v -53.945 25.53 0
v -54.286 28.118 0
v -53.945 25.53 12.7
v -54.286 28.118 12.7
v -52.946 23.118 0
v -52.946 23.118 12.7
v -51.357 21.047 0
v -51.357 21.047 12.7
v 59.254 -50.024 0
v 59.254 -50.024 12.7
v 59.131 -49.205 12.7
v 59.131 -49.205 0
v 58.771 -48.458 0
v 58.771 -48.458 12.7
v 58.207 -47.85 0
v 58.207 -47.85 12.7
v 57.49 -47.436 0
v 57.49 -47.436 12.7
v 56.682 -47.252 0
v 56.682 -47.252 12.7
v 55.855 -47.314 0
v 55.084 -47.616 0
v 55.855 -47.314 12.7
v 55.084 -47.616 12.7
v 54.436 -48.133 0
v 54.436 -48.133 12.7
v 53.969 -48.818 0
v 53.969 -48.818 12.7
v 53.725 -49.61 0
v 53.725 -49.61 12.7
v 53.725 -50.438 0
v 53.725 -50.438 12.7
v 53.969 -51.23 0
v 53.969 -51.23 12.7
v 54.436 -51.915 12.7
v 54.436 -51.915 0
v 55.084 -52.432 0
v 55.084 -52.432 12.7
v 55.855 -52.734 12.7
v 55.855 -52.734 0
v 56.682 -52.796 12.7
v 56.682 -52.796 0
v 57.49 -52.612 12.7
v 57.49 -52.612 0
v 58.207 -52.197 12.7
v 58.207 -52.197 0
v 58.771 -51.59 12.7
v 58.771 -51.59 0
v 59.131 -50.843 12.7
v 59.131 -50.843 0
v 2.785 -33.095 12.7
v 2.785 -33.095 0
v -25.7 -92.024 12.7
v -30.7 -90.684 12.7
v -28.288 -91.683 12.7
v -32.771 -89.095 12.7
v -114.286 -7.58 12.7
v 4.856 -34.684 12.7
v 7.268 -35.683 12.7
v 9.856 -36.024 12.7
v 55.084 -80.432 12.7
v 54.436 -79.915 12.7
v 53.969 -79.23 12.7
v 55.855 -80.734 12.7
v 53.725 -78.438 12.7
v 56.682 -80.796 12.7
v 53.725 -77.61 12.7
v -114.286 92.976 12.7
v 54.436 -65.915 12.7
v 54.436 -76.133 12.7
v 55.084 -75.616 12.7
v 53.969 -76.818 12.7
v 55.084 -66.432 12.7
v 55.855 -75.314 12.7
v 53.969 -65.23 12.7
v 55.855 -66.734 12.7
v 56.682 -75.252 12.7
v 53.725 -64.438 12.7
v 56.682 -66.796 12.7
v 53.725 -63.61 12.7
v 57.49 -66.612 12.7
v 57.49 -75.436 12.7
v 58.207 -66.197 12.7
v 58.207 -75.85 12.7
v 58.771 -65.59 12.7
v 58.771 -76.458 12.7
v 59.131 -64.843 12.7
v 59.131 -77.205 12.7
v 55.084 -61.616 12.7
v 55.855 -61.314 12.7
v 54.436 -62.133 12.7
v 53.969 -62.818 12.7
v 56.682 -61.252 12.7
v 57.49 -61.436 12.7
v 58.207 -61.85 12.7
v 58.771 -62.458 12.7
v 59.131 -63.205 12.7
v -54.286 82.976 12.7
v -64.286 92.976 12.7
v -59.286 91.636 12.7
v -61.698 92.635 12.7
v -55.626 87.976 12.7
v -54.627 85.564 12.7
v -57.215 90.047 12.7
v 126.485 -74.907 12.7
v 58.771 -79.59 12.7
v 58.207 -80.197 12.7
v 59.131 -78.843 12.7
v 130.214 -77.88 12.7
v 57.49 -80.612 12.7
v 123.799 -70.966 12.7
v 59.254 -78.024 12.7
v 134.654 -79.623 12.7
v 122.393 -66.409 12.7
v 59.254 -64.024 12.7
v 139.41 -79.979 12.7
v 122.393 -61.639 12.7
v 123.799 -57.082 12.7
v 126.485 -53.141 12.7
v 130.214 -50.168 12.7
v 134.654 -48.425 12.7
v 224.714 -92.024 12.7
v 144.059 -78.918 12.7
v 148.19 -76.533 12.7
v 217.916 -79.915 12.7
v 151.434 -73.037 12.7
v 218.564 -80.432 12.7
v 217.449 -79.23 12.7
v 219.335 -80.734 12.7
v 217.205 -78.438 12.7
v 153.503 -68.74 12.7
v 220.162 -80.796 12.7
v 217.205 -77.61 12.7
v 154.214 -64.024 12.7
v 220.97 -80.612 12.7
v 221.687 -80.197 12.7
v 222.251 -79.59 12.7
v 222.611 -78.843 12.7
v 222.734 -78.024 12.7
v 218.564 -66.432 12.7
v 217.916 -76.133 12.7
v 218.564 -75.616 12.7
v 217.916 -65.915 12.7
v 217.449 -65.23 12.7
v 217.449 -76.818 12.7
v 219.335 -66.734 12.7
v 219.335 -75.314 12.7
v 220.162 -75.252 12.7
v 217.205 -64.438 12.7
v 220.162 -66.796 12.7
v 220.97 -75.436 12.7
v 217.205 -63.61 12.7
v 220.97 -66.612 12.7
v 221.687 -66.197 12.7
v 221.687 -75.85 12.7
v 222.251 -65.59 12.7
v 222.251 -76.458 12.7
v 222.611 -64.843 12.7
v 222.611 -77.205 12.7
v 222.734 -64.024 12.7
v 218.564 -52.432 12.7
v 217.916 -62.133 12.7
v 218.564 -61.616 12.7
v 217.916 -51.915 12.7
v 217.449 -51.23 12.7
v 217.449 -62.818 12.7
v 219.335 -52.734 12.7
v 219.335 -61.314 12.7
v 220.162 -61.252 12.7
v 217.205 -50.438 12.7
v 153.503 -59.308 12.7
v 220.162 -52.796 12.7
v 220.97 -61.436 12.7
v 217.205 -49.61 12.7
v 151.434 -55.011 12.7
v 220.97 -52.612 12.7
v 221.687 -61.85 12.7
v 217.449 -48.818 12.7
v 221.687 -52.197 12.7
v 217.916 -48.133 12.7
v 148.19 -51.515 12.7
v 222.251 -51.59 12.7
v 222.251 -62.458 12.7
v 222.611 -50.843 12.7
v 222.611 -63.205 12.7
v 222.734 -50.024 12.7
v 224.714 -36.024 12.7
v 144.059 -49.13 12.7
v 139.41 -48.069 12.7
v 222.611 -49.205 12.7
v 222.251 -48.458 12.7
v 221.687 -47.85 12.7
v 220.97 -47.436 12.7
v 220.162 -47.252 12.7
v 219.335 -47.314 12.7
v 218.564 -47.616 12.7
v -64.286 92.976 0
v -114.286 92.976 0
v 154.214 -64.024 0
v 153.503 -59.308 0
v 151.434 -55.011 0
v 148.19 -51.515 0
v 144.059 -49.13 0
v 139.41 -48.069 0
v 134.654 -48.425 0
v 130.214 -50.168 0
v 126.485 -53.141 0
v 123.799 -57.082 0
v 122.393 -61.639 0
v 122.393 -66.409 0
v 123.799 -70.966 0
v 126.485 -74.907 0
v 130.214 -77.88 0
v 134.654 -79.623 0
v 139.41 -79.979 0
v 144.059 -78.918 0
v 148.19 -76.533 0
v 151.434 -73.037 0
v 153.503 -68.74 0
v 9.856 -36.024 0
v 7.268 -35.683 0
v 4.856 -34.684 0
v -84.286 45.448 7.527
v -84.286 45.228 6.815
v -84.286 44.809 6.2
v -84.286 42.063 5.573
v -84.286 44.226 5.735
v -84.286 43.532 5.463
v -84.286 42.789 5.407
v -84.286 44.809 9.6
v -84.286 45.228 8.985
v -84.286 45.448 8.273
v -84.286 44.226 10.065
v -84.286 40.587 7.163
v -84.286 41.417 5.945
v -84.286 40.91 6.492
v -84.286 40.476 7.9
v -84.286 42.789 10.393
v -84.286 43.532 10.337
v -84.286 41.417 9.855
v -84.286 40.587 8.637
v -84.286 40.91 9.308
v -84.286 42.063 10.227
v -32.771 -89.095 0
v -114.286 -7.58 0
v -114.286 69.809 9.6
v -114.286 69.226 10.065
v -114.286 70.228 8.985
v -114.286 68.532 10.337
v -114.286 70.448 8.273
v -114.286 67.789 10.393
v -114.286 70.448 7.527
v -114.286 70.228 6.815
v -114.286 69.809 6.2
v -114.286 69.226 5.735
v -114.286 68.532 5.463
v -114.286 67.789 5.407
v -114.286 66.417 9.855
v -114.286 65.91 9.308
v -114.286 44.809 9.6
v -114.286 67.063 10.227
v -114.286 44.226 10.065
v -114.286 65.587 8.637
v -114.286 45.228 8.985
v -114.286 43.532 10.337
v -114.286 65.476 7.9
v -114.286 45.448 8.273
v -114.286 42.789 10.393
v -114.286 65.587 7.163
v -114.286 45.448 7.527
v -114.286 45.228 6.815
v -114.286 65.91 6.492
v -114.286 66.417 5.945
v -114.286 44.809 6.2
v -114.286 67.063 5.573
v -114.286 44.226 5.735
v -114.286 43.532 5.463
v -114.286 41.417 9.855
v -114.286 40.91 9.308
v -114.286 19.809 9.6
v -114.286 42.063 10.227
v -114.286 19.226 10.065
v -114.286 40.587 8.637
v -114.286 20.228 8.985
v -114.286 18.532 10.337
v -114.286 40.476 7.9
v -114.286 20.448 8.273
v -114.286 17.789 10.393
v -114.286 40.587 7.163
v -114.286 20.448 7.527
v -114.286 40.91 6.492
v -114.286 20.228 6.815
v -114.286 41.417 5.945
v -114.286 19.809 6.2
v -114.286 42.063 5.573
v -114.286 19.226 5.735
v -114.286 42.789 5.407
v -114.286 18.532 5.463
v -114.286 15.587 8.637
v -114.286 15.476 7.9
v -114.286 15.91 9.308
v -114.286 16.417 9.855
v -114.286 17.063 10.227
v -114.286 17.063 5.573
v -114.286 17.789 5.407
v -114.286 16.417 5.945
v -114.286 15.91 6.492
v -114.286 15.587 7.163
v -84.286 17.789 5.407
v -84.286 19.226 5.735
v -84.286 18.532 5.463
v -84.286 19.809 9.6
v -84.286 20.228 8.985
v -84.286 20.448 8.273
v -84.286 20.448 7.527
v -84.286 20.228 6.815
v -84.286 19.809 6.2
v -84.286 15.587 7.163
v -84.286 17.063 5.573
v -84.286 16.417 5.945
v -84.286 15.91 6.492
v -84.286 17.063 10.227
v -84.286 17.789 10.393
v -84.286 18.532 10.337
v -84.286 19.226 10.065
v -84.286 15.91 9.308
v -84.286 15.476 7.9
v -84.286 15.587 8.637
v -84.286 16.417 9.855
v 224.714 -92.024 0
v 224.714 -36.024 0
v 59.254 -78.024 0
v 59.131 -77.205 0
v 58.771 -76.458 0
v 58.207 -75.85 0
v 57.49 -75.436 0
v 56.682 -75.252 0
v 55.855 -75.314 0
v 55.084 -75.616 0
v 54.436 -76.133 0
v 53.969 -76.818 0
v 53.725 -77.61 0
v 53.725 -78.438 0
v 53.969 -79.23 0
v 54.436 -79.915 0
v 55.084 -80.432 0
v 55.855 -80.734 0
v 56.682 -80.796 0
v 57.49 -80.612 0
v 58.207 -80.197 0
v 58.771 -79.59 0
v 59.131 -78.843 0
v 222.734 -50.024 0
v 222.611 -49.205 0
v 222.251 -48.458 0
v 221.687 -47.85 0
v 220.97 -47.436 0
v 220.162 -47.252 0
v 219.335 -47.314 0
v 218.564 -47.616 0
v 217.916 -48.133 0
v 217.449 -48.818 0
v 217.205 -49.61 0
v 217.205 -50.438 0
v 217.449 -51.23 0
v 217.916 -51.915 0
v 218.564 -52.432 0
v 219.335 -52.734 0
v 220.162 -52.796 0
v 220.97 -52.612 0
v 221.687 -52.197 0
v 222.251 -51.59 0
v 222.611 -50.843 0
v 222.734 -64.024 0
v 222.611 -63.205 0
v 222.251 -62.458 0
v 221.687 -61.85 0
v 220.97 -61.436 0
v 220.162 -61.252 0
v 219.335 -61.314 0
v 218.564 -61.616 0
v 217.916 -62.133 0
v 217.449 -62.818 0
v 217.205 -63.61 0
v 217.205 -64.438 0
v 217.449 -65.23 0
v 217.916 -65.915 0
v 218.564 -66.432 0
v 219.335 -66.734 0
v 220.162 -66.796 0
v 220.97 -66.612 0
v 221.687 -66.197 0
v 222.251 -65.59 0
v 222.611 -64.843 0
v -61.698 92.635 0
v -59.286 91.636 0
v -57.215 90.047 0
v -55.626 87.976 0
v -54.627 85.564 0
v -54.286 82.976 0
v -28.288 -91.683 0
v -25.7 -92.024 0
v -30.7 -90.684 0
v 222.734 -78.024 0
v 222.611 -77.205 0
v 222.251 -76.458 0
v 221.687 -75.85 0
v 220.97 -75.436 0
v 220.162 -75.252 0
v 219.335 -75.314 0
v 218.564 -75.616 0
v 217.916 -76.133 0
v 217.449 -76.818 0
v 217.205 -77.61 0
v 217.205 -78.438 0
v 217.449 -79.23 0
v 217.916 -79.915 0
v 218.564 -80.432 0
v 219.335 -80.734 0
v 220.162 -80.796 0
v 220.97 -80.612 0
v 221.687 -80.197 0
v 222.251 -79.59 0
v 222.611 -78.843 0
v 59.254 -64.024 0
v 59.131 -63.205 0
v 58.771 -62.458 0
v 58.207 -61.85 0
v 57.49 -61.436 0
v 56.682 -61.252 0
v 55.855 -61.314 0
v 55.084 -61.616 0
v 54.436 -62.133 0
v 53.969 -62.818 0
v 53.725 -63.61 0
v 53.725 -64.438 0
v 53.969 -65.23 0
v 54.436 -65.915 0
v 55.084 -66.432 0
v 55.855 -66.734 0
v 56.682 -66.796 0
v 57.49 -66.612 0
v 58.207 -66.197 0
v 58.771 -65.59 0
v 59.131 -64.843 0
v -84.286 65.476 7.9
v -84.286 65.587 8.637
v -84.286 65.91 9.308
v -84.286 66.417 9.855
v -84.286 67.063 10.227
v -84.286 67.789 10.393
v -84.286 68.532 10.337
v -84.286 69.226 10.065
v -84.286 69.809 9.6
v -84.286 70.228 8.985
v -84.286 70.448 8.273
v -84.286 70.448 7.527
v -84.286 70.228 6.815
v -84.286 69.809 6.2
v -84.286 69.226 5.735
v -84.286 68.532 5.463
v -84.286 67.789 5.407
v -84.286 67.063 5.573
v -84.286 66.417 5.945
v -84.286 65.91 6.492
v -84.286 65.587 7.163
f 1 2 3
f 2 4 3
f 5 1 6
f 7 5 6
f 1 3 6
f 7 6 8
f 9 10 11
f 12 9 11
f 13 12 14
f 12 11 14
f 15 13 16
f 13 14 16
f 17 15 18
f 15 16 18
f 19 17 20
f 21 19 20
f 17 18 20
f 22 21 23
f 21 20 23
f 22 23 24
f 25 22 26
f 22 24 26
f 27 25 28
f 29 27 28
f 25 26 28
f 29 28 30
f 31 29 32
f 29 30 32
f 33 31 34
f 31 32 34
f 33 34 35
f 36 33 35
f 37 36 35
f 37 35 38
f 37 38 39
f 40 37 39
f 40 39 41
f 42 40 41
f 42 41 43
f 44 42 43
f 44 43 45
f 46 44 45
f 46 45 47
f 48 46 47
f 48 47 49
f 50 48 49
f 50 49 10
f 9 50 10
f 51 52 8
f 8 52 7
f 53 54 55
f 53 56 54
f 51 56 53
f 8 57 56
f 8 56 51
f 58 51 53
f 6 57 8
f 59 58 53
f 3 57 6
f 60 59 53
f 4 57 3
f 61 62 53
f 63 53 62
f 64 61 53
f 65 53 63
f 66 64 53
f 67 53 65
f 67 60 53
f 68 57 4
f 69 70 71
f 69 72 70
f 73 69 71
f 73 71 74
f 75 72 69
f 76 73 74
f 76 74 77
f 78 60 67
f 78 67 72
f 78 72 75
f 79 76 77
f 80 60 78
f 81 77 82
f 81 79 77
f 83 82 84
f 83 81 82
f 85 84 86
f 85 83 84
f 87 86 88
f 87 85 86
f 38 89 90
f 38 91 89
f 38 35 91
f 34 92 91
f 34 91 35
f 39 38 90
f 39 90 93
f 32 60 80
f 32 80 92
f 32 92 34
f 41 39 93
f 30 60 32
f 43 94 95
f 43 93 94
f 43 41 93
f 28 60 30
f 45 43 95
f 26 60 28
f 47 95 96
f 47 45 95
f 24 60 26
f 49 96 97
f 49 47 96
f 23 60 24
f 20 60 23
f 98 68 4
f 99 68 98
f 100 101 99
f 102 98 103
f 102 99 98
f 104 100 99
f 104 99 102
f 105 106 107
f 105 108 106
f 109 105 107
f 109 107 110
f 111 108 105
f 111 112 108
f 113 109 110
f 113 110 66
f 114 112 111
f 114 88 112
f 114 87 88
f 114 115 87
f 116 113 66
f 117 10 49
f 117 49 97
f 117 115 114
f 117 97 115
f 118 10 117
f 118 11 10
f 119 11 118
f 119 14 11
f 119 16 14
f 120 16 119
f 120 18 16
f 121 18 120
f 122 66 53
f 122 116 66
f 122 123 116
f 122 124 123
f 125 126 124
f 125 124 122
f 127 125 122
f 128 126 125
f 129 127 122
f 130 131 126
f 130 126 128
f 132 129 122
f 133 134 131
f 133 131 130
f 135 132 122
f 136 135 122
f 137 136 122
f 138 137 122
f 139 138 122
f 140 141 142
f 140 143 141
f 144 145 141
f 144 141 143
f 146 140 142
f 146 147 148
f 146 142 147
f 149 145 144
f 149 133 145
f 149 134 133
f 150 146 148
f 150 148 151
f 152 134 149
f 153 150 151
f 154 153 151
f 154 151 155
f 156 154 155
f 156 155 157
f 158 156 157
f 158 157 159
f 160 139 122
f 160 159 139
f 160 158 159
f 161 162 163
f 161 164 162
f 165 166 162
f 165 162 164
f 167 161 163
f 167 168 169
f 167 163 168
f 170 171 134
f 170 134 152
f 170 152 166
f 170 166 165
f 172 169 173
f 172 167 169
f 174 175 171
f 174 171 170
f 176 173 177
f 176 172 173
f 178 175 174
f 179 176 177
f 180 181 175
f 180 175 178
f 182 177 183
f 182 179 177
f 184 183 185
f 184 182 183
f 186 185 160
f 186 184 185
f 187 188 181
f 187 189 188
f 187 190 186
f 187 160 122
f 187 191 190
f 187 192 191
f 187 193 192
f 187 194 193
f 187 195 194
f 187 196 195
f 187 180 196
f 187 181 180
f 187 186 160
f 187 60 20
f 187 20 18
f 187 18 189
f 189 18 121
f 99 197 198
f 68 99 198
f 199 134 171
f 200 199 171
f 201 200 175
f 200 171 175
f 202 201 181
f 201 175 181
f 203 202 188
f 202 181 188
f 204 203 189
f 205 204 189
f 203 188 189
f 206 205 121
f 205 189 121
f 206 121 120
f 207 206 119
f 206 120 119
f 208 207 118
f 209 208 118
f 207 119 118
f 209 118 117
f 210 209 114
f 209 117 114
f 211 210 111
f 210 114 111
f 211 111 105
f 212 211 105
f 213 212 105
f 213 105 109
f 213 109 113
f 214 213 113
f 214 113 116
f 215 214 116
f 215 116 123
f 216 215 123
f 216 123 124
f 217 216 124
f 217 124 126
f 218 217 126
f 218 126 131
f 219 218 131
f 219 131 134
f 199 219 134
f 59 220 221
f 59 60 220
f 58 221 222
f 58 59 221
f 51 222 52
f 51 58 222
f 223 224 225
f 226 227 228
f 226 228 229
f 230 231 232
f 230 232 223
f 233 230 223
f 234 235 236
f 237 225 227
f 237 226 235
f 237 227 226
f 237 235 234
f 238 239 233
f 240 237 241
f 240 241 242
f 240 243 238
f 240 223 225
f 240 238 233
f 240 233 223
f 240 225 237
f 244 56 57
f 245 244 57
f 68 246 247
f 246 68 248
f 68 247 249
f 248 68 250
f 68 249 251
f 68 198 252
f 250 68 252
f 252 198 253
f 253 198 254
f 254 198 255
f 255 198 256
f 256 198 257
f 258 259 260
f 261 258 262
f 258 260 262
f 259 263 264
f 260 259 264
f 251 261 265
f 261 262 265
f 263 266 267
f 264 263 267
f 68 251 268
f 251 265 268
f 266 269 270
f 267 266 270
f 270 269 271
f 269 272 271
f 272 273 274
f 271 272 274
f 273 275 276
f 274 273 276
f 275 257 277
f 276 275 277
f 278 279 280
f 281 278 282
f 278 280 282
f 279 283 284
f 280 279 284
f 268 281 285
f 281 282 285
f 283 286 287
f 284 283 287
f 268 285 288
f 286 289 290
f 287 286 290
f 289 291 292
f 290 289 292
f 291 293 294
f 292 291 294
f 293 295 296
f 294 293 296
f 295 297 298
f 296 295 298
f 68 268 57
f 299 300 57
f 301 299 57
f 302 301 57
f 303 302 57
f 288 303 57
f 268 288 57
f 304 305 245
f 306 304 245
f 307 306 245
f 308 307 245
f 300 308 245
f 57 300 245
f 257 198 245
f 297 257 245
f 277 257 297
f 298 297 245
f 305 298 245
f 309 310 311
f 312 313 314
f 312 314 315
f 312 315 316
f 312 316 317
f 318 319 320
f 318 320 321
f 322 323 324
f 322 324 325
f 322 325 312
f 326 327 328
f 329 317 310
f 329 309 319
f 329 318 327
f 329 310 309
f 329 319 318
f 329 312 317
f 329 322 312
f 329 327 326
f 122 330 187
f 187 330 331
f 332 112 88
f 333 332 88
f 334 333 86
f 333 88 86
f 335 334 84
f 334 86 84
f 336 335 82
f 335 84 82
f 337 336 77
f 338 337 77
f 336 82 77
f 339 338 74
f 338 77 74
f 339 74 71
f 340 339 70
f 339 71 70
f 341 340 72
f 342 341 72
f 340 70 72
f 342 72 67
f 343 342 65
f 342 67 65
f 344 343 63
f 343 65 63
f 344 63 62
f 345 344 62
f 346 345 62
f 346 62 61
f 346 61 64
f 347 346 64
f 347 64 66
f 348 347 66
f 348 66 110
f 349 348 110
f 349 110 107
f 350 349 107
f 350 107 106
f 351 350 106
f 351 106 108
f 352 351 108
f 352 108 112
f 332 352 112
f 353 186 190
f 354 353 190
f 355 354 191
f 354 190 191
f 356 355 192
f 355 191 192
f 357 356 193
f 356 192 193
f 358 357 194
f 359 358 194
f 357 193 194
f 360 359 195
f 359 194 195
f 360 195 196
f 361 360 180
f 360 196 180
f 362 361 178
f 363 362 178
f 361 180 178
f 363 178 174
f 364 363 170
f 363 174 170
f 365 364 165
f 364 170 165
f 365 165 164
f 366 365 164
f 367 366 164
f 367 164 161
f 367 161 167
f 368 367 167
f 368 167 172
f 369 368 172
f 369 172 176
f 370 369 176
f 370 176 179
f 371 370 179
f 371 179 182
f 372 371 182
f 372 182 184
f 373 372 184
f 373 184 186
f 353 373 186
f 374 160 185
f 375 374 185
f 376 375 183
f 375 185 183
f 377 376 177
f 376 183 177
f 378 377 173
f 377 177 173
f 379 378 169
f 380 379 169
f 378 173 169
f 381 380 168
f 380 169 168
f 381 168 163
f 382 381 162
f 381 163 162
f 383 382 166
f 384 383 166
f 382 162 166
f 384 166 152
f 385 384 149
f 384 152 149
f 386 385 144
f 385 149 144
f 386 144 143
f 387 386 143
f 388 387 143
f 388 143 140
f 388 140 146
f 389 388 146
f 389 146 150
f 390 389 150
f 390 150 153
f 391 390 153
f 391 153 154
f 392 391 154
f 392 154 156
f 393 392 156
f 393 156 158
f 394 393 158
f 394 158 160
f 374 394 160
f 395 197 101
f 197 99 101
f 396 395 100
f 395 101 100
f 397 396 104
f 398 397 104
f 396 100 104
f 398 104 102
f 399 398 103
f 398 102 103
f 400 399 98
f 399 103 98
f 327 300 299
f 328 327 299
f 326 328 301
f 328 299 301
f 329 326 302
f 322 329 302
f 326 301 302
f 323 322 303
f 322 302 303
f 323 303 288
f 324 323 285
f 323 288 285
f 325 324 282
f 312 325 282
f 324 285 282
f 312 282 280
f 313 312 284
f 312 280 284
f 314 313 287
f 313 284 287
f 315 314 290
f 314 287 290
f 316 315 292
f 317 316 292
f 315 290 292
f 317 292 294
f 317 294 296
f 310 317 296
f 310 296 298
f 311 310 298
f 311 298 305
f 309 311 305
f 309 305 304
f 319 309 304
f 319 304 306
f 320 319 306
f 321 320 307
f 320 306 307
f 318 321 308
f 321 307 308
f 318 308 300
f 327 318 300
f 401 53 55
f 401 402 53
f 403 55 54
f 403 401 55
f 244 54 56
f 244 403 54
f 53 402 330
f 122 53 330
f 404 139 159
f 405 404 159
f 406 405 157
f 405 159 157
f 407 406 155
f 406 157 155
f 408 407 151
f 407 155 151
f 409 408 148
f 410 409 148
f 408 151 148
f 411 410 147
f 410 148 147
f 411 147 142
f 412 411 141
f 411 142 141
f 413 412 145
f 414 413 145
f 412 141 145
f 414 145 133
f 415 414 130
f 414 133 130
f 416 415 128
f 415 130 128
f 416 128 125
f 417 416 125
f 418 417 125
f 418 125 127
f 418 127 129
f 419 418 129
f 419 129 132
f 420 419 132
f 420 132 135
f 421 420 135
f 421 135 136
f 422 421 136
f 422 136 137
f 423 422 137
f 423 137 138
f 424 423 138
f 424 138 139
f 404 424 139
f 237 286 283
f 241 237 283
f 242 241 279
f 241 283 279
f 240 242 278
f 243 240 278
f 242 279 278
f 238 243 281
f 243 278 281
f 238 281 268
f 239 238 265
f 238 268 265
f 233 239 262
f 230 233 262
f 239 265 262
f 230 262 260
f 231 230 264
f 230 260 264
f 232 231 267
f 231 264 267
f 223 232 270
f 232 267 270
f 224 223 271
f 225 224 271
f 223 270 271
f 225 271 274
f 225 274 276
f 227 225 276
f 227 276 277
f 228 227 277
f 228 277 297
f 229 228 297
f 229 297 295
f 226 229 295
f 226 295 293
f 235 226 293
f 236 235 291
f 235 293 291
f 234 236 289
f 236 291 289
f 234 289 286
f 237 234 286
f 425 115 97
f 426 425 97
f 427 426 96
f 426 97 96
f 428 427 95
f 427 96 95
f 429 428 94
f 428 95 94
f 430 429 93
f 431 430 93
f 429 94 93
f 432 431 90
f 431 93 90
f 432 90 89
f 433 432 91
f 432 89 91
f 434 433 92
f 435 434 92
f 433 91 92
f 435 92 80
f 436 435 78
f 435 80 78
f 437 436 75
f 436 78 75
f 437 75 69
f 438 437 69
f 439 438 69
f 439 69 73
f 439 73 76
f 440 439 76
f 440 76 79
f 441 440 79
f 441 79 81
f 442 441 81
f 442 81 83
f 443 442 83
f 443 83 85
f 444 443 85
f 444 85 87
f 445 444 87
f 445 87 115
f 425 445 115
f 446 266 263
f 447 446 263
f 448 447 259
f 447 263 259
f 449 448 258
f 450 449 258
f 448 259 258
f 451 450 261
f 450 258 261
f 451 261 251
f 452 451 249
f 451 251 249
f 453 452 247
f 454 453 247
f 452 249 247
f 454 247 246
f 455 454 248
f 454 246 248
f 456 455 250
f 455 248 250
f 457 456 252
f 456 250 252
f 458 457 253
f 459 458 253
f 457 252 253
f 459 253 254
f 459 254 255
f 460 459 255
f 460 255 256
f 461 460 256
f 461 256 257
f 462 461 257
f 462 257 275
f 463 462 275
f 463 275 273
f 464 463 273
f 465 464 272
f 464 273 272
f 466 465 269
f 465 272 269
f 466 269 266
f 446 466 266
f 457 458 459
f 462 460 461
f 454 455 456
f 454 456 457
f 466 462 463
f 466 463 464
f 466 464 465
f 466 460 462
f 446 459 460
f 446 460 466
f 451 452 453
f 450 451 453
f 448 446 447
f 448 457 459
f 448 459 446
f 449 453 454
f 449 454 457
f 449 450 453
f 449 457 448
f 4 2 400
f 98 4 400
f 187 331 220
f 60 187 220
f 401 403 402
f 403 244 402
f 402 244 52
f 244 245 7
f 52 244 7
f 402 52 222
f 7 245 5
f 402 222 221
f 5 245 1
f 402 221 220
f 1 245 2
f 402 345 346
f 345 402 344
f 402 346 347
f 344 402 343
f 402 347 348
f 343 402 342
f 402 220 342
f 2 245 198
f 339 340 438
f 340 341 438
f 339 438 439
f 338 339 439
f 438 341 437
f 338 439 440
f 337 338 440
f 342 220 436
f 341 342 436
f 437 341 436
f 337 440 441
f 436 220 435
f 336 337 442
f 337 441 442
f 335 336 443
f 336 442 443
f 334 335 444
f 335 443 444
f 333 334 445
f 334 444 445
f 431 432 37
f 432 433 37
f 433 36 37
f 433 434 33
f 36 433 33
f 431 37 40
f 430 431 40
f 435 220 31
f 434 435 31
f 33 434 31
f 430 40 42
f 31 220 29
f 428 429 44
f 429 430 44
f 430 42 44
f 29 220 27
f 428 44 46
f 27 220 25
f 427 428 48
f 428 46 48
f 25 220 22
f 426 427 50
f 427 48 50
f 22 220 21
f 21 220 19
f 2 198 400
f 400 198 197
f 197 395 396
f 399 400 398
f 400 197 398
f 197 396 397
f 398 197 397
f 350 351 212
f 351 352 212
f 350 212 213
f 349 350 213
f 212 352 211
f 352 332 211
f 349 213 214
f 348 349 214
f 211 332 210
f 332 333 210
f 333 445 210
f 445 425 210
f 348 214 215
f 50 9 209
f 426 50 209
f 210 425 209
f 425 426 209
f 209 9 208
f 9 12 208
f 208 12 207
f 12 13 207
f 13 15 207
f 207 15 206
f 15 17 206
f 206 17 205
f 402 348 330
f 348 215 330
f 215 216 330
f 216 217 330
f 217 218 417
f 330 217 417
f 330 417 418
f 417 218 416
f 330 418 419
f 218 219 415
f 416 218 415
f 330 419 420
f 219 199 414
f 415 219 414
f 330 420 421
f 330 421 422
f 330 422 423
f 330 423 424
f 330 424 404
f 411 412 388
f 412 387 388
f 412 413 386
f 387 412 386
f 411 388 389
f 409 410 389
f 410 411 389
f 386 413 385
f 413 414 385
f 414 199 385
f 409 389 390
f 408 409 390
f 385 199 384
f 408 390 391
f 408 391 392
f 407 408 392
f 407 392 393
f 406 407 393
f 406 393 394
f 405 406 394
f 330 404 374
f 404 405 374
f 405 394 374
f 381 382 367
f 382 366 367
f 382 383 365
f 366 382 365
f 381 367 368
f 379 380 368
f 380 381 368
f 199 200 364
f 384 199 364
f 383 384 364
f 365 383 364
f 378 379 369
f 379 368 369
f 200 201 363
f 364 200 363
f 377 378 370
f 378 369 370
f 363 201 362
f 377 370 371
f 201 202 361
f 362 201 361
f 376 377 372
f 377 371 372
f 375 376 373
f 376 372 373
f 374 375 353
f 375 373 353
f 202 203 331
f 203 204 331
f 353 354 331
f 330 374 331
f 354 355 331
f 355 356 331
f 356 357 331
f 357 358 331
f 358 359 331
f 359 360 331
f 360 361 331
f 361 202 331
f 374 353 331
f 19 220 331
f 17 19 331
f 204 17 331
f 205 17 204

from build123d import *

# Parameters (mm, degrees)
RESSALTO_EXTRUS_O1_DEPTH = 12.7
CIRCULO_ROLAMENTO_REACH  = 245.52
ESBO_O3_R                = 16
ESBO_O6_R                = 2.5
CORTE_EXTRUS_O4_DEPTH    = 30
CORTE_EXTRUS_O6_REACH    = 245.52
CORTE_EXTRUS_O7_REACH    = 245.52
ESBO_O10_R               = 2.78
CORTE_EXTRUS_O8_REACH    = 245.52
ESBO_O12_R               = 2.78
FILETE1_R                = 10


with BuildPart() as part:
    # Esboço1 → Ressalto-extrusão1 (new body)
    with BuildSketch(Plane.XY):
        Polygon((-114.28595772, -92.023971813), (224.71404228, -92.023971813), (224.71404228, -36.023971813), (5.71404228, -36.023971813), (-54.28595772, 23.976028187), (-54.28595772, 92.976028187), (-114.28595772, 92.976028187), align=None)
    extrude(amount=RESSALTO_EXTRUS_O1_DEPTH)

    # Esboço3 → Circulo rolamento (cut, up to next)
    with BuildSketch(Plane.XY.offset(12.7), mode=Mode.PRIVATE) as circulo_rolamento_sk1:
        with Locations((138.21404228, -64.023971813)):
            Circle(ESBO_O3_R)
    circulo_rolamento_tool1 = extrude(circulo_rolamento_sk1.sketch, amount=-CIRCULO_ROLAMENTO_REACH, mode=Mode.PRIVATE) & part.part
    add(circulo_rolamento_tool1.solids().sort_by_distance((138.214042, -64.023972, 12.7))[0], mode=Mode.SUBTRACT)

    # Esboço6 → Corte-extrusão4 (cut)
    with BuildSketch(Plane.ZY.offset(114.28595772)):
        with Locations(Location((7.9, 67.976028187, 0), (0, 0, 270))):
            Circle(ESBO_O6_R)
        with Locations(Location((7.9, 42.976028187, 0), (0, 0, 270))):
            Circle(ESBO_O6_R)
        with Locations(Location((7.9, 17.976028187, 0), (0, 0, 270))):
            Circle(ESBO_O6_R)
    extrude(amount=-CORTE_EXTRUS_O4_DEPTH, mode=Mode.SUBTRACT)

    # Esboço9 → Corte-extrusão6 (cut, up to next)
    with BuildSketch(Plane.XY.offset(12.7), mode=Mode.PRIVATE) as corte_extrus_o6_sk1:
        Polygon((-29.841868762, -92.023971813), (-114.28595772, -7.579882856), (-114.28595772, -92.023971813), align=None)
    corte_extrus_o6_tool1 = extrude(corte_extrus_o6_sk1.sketch, amount=-CORTE_EXTRUS_O6_REACH, mode=Mode.PRIVATE) & part.part
    add(corte_extrus_o6_tool1.solids().sort_by_distance((-86.137928, -63.875942, 12.7))[0], mode=Mode.SUBTRACT)

    # Esboço10 → Corte-extrusão7 (cut, up to next)
    with BuildSketch(Plane.XY.offset(12.7), mode=Mode.PRIVATE) as corte_extrus_o7_sk1:
        with Locations((56.47404228, -50.023971813)):
            Circle(ESBO_O10_R)
    corte_extrus_o7_tool1 = extrude(corte_extrus_o7_sk1.sketch, amount=-CORTE_EXTRUS_O7_REACH, mode=Mode.PRIVATE) & part.part
    # Esboço10 → Corte-extrusão7 (cut, up to next)
    with BuildSketch(Plane.XY.offset(12.7), mode=Mode.PRIVATE) as corte_extrus_o7_sk2:
        with Locations((56.47404228, -64.023971813)):
            Circle(ESBO_O10_R)
    corte_extrus_o7_tool2 = extrude(corte_extrus_o7_sk2.sketch, amount=-CORTE_EXTRUS_O7_REACH, mode=Mode.PRIVATE) & part.part
    # Esboço10 → Corte-extrusão7 (cut, up to next)
    with BuildSketch(Plane.XY.offset(12.7), mode=Mode.PRIVATE) as corte_extrus_o7_sk3:
        with Locations((56.47404228, -78.023971813)):
            Circle(ESBO_O10_R)
    corte_extrus_o7_tool3 = extrude(corte_extrus_o7_sk3.sketch, amount=-CORTE_EXTRUS_O7_REACH, mode=Mode.PRIVATE) & part.part
    add(corte_extrus_o7_tool1.solids().sort_by_distance((56.474042, -50.023972, 12.7))[0], mode=Mode.SUBTRACT)
    add(corte_extrus_o7_tool2.solids().sort_by_distance((56.474042, -64.023972, 12.7))[0], mode=Mode.SUBTRACT)
    add(corte_extrus_o7_tool3.solids().sort_by_distance((56.474042, -78.023972, 12.7))[0], mode=Mode.SUBTRACT)

    # Esboço12 → Corte-extrusão8 (cut, up to next)
    with BuildSketch(Plane.XY.offset(12.7), mode=Mode.PRIVATE) as corte_extrus_o8_sk1:
        with Locations((219.95404228, -78.023971813)):
            Circle(ESBO_O12_R)
    corte_extrus_o8_tool1 = extrude(corte_extrus_o8_sk1.sketch, amount=-CORTE_EXTRUS_O8_REACH, mode=Mode.PRIVATE) & part.part
    # Esboço12 → Corte-extrusão8 (cut, up to next)
    with BuildSketch(Plane.XY.offset(12.7), mode=Mode.PRIVATE) as corte_extrus_o8_sk2:
        with Locations((219.95404228, -64.023971813)):
            Circle(ESBO_O12_R)
    corte_extrus_o8_tool2 = extrude(corte_extrus_o8_sk2.sketch, amount=-CORTE_EXTRUS_O8_REACH, mode=Mode.PRIVATE) & part.part
    # Esboço12 → Corte-extrusão8 (cut, up to next)
    with BuildSketch(Plane.XY.offset(12.7), mode=Mode.PRIVATE) as corte_extrus_o8_sk3:
        with Locations((219.95404228, -50.023971813)):
            Circle(ESBO_O12_R)
    corte_extrus_o8_tool3 = extrude(corte_extrus_o8_sk3.sketch, amount=-CORTE_EXTRUS_O8_REACH, mode=Mode.PRIVATE) & part.part
    add(corte_extrus_o8_tool1.solids().sort_by_distance((219.954042, -78.023972, 12.7))[0], mode=Mode.SUBTRACT)
    add(corte_extrus_o8_tool2.solids().sort_by_distance((219.954042, -64.023972, 12.7))[0], mode=Mode.SUBTRACT)
    add(corte_extrus_o8_tool3.solids().sort_by_distance((219.954042, -50.023972, 12.7))[0], mode=Mode.SUBTRACT)

    # Filete1
    filete1_edges = [part.edges().sort_by_distance(p)[0] for p in [
        (-54.28595772, 92.976028187, 6.35),
        (-54.28595772, 23.976028187, 6.35),
        (5.71404228, -36.023971813, 6.35),
        (-29.841868762, -92.023971813, 6.35),
    ]]
    fillet(filete1_edges, radius=FILETE1_R)


solid = part.part
